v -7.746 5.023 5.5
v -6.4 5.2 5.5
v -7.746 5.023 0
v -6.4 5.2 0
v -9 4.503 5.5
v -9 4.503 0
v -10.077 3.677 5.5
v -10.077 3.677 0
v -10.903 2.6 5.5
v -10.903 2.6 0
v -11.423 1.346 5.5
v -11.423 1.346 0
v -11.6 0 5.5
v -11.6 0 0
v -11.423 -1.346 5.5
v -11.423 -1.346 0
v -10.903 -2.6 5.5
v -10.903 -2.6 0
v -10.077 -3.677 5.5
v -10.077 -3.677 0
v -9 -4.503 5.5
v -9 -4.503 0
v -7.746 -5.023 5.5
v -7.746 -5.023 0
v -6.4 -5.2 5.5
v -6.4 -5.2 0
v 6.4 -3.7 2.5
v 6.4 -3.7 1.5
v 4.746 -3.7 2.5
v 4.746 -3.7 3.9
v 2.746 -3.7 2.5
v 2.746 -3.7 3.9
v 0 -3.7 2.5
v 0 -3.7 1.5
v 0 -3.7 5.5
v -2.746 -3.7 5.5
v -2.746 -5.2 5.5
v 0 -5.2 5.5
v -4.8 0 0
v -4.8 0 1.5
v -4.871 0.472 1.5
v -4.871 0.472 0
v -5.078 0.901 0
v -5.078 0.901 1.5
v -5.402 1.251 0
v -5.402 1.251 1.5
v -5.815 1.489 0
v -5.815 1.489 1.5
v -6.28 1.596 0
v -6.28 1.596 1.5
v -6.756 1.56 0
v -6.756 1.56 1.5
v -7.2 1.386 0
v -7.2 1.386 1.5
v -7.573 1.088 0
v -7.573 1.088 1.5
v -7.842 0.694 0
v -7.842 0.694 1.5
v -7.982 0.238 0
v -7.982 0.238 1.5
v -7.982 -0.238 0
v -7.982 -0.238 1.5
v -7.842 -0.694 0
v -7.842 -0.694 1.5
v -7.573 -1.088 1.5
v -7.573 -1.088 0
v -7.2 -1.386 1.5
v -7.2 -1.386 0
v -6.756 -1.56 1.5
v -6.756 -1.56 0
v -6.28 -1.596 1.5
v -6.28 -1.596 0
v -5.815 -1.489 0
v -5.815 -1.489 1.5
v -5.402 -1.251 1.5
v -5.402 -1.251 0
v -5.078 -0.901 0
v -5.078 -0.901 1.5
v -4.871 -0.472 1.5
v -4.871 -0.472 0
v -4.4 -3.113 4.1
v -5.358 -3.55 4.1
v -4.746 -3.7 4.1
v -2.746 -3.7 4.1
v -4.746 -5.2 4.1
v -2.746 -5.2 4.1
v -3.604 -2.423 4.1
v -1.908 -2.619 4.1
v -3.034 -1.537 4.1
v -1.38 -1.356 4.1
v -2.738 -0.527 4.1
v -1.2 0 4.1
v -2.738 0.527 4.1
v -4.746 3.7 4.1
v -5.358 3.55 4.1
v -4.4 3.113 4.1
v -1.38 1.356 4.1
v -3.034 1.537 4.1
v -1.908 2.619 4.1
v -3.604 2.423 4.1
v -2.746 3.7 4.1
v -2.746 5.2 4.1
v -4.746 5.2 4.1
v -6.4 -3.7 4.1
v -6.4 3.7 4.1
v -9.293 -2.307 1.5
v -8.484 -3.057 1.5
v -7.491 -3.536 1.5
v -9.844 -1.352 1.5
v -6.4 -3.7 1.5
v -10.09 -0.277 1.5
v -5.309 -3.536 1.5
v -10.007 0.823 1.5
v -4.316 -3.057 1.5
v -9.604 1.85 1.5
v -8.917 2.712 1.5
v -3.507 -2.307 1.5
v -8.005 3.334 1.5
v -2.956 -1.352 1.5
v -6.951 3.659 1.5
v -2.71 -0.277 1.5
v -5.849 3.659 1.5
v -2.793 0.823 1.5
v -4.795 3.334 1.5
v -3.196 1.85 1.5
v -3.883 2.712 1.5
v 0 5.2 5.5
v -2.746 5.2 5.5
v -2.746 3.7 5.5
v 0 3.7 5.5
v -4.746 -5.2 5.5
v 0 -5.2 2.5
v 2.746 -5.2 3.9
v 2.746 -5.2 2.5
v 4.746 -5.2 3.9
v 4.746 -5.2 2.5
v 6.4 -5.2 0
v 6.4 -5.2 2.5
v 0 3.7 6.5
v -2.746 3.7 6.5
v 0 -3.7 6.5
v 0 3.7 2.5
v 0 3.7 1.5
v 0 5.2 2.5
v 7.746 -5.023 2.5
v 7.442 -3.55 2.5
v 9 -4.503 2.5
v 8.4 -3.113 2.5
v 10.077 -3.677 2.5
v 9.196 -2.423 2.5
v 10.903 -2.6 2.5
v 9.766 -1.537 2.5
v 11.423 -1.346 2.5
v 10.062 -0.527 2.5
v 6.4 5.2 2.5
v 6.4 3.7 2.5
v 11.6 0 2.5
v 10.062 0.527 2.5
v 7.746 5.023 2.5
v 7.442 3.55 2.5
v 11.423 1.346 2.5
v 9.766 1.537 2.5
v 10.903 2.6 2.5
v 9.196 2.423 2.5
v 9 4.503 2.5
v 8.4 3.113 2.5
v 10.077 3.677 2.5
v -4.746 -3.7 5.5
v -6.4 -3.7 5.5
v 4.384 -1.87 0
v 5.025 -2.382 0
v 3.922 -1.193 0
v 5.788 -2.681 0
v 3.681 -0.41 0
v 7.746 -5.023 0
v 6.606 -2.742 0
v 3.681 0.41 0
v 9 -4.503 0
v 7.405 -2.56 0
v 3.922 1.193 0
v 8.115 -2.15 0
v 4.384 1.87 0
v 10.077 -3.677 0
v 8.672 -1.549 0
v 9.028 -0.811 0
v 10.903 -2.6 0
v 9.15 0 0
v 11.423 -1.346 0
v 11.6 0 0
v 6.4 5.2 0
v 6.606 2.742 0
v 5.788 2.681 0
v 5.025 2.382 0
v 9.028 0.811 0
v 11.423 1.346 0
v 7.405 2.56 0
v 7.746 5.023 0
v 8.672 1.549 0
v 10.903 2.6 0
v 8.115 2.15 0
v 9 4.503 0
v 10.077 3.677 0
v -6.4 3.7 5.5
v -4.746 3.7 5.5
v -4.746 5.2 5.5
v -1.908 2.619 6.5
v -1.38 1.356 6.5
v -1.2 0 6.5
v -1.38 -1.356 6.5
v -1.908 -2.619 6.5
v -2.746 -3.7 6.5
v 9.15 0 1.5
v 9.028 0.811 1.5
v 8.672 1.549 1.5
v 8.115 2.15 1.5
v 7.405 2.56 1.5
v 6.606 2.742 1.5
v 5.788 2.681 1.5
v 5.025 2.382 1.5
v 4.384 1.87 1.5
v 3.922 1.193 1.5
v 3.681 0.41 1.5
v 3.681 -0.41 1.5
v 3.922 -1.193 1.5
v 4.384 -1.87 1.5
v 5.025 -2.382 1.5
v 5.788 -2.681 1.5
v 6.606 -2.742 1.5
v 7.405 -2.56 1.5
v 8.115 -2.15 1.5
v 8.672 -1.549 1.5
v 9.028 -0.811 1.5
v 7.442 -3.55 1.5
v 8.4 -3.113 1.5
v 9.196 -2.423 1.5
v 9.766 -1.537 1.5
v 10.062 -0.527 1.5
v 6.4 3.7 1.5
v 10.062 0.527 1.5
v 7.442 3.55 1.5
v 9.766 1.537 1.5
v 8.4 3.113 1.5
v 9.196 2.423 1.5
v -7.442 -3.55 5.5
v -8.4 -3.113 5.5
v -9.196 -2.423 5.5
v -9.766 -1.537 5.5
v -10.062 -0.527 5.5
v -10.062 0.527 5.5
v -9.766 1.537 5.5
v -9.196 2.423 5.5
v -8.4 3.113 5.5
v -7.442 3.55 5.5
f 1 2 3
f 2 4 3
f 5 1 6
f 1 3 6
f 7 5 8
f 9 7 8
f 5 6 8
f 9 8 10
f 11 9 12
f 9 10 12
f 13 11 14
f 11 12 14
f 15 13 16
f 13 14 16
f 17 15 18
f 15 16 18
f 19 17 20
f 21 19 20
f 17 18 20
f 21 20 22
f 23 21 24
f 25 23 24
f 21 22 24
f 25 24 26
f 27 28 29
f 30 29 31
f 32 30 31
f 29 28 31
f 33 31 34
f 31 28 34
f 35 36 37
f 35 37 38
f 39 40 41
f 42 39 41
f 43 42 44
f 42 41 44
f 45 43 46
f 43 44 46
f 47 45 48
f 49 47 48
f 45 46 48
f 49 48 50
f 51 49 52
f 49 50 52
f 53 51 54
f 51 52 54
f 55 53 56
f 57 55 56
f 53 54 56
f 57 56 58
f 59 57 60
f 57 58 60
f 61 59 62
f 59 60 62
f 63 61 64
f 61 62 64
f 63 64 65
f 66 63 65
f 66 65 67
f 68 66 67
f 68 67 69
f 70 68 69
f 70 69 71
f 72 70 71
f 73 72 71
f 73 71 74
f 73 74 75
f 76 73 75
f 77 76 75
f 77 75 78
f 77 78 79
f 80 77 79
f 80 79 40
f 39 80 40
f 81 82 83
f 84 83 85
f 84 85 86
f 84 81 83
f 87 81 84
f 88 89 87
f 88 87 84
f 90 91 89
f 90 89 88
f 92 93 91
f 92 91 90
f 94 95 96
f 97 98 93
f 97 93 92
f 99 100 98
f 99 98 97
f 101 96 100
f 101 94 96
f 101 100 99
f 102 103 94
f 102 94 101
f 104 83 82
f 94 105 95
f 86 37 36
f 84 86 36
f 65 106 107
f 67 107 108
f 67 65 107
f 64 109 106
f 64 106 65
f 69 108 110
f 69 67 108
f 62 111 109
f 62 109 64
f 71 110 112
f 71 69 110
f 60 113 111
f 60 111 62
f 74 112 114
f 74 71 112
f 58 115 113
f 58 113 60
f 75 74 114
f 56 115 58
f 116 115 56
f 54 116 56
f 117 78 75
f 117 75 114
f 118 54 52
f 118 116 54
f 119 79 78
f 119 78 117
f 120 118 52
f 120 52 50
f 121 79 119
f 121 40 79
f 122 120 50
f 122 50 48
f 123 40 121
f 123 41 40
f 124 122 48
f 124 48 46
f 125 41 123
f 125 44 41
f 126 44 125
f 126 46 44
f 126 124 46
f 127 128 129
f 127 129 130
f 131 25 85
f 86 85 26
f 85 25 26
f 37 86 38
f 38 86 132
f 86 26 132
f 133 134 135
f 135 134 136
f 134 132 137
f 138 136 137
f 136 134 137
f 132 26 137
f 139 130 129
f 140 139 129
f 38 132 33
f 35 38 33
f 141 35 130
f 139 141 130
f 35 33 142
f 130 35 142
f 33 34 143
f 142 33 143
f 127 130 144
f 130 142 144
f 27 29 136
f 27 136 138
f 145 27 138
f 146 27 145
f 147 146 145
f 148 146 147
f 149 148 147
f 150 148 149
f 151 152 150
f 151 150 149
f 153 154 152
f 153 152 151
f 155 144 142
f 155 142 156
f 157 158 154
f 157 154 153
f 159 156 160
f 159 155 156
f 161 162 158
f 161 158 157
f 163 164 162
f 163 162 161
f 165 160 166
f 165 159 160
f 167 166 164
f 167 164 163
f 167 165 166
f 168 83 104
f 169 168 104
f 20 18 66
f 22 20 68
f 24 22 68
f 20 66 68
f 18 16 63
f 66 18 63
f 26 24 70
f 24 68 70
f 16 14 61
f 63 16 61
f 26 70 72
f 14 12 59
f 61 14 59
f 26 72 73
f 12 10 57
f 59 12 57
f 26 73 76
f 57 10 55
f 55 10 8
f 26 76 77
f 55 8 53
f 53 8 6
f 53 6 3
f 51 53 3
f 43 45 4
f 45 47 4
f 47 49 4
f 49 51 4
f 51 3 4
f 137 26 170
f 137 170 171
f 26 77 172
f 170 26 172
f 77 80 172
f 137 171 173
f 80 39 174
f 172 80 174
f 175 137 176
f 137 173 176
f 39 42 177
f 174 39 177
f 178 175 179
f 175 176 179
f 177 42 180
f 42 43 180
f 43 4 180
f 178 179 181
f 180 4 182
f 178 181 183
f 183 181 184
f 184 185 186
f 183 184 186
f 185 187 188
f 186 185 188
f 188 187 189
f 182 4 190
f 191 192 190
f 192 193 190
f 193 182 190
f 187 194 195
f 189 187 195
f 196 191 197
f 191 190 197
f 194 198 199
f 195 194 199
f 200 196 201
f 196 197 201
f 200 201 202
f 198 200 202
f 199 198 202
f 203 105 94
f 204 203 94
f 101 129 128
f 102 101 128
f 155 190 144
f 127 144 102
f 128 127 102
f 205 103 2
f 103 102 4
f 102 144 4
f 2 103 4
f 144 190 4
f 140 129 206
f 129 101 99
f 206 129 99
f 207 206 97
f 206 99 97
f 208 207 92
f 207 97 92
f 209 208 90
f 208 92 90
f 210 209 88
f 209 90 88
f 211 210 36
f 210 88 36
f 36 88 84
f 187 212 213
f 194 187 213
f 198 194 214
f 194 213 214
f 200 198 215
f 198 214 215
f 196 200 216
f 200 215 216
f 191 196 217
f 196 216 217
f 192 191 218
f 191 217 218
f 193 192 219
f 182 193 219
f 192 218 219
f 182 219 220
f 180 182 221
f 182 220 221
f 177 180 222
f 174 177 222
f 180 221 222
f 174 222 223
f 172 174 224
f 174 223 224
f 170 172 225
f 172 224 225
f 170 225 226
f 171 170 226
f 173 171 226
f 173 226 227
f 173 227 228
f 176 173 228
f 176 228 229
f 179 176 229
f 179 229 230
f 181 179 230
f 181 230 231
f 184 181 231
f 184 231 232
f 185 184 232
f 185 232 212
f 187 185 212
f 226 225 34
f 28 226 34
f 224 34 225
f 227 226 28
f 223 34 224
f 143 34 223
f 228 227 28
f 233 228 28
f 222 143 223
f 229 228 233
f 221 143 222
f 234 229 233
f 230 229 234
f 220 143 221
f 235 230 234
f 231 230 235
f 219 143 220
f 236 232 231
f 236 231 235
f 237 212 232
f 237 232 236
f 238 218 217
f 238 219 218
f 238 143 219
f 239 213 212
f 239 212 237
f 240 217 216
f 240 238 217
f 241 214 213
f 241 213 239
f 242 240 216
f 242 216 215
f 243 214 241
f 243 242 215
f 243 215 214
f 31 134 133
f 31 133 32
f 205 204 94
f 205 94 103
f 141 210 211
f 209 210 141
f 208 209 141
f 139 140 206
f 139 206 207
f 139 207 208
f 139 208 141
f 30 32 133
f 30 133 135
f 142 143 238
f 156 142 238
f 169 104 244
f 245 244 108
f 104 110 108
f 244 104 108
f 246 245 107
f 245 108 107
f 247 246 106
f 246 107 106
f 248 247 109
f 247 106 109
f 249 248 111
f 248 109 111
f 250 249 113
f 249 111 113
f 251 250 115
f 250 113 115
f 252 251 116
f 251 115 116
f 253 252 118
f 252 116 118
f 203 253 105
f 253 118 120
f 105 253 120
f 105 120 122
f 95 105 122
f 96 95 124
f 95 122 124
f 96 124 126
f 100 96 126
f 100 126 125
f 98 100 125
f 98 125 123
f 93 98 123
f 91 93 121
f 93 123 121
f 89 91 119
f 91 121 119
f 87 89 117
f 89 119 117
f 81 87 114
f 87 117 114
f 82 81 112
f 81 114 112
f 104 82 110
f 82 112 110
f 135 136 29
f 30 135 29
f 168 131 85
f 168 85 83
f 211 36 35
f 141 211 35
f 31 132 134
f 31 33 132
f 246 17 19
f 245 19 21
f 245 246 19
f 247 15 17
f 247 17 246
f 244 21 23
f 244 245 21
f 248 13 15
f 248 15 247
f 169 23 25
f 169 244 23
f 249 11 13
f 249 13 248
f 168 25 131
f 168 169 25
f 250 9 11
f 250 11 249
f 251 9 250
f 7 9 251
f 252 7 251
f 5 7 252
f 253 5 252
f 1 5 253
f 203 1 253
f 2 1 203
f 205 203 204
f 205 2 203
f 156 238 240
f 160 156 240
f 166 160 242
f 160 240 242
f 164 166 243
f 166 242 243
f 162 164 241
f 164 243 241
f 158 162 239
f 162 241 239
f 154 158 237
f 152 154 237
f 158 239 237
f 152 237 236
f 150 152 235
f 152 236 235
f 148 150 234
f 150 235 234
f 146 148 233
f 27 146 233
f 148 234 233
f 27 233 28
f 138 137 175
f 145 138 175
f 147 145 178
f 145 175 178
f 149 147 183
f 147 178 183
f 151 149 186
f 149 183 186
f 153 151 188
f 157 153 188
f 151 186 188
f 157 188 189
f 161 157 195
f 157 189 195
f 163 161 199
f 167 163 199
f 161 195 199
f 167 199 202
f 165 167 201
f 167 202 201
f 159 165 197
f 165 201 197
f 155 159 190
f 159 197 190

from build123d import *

# Parameters (mm, degrees)
F1_DEPTH  = 1.5
F3_DEPTH  = 4
F4_DEPTH  = 1
F6_DEPTH  = 2.6
F7_R      = 1.6
F7_R_2    = 2.75
F8_DEPTH  = 1.501
F10_DEPTH = 5
F11_W     = 2
F11_H     = 1.5
F12_DEPTH = 1.4
F13_W     = 2
F13_H     = 1.5
F14_DEPTH = 1.4


with BuildPart() as f1:
    # F0 (on Top) → F1 (new body)
    with BuildSketch(Plane.XY):
        with BuildLine():
            Line((6.4, 5.2), (-6.4, 5.2))
            ThreePointArc((-6.4, 5.2), (-11.6, 0), (-6.4, -5.2))
            Line((-6.4, -5.2), (6.4, -5.2))
            ThreePointArc((6.4, -5.2), (11.6, 0), (6.4, 5.2))
        make_face()
    extrude(amount=F1_DEPTH)

    # F2 (on face) → F3 (join)
    with BuildSketch(Plane.XY.offset(1.5)):
        with BuildLine():
            Line((0, 5.2), (-6.4, 5.2))
            ThreePointArc((-6.4, 5.2), (-11.6, 0), (-6.4, -5.2))
            Line((-6.4, -5.2), (0, -5.2))
            Line((0, -5.2), (0, -3.7))
            Line((0, -3.7), (-6.4, -3.7))
            ThreePointArc((-6.4, -3.7), (-10.1, 0), (-6.4, 3.7))
            Line((-6.4, 3.7), (0, 3.7))
            Line((0, 3.7), (0, 5.2))
        make_face()
    extrude(amount=F3_DEPTH)

    # F2 (on face) → F4 (join)
    with BuildSketch(Plane.XY.offset(1.5)):
        with BuildLine():
            Line((6.4, 5.2), (0, 5.2))
            Line((0, 5.2), (0, 3.7))
            Line((0, 3.7), (6.4, 3.7))
            ThreePointArc((6.4, 3.7), (10.1, 0), (6.4, -3.7))
            Line((6.4, -3.7), (0, -3.7))
            Line((0, -3.7), (0, -5.2))
            Line((0, -5.2), (6.4, -5.2))
            ThreePointArc((6.4, -5.2), (11.6, 0), (6.4, 5.2))
        make_face()
    extrude(amount=F4_DEPTH)

    # F5 (on face) → F6 (join)
    with BuildSketch(Plane.XY.offset(1.5)):
        with BuildLine():
            Line((-6.4, -3.7), (-2.746235, -3.7))
            ThreePointArc((-2.746235, -3.7), (-1.2, 0), (-2.746235, 3.7))
            Line((-2.746235, 3.7), (-6.4, 3.7))
            ThreePointArc((-6.4, 3.7), (-2.7, 0), (-6.4, -3.7))
        make_face()
    extrude(amount=F6_DEPTH)

    # F7 (on face) → F8 (cut, through all)
    with BuildSketch(Plane.XY.offset(1.5)):
        with Locations((-6.4, 0)):
            Circle(F7_R)
        with Locations((6.4, 0)):
            Circle(F7_R_2)
    extrude(amount=-F8_DEPTH, mode=Mode.SUBTRACT)

    # F9 (on face) → F10 (join)
    with BuildSketch(Plane.XY.offset(1.5)):
        with BuildLine():
            Line((-2.746235, -3.7), (0, -3.7))
            Line((0, -3.7), (0, 3.7))
            Line((0, 3.7), (-2.746235, 3.7))
            ThreePointArc((-2.746235, 3.7), (-1.2, 0), (-2.746235, -3.7))
        make_face()
    extrude(amount=F10_DEPTH)

    # F11 (on face) → F12 (cut, through all)
    with BuildSketch(Plane.XY.offset(5.5)):
        with Locations((-3.746235, -4.45)):
            Rectangle(F11_W, F11_H)
        with Locations((-3.746235, 4.45)):
            Rectangle(F11_W, F11_H)
    extrude(amount=-F12_DEPTH, mode=Mode.SUBTRACT)

    # F13 (on face) → F14 (join)
    with BuildSketch(Plane.XY.offset(2.5)):
        with Locations((3.746235, -4.45)):
            Rectangle(F13_W, F13_H)
    extrude(amount=F14_DEPTH)


solid = f1.part
